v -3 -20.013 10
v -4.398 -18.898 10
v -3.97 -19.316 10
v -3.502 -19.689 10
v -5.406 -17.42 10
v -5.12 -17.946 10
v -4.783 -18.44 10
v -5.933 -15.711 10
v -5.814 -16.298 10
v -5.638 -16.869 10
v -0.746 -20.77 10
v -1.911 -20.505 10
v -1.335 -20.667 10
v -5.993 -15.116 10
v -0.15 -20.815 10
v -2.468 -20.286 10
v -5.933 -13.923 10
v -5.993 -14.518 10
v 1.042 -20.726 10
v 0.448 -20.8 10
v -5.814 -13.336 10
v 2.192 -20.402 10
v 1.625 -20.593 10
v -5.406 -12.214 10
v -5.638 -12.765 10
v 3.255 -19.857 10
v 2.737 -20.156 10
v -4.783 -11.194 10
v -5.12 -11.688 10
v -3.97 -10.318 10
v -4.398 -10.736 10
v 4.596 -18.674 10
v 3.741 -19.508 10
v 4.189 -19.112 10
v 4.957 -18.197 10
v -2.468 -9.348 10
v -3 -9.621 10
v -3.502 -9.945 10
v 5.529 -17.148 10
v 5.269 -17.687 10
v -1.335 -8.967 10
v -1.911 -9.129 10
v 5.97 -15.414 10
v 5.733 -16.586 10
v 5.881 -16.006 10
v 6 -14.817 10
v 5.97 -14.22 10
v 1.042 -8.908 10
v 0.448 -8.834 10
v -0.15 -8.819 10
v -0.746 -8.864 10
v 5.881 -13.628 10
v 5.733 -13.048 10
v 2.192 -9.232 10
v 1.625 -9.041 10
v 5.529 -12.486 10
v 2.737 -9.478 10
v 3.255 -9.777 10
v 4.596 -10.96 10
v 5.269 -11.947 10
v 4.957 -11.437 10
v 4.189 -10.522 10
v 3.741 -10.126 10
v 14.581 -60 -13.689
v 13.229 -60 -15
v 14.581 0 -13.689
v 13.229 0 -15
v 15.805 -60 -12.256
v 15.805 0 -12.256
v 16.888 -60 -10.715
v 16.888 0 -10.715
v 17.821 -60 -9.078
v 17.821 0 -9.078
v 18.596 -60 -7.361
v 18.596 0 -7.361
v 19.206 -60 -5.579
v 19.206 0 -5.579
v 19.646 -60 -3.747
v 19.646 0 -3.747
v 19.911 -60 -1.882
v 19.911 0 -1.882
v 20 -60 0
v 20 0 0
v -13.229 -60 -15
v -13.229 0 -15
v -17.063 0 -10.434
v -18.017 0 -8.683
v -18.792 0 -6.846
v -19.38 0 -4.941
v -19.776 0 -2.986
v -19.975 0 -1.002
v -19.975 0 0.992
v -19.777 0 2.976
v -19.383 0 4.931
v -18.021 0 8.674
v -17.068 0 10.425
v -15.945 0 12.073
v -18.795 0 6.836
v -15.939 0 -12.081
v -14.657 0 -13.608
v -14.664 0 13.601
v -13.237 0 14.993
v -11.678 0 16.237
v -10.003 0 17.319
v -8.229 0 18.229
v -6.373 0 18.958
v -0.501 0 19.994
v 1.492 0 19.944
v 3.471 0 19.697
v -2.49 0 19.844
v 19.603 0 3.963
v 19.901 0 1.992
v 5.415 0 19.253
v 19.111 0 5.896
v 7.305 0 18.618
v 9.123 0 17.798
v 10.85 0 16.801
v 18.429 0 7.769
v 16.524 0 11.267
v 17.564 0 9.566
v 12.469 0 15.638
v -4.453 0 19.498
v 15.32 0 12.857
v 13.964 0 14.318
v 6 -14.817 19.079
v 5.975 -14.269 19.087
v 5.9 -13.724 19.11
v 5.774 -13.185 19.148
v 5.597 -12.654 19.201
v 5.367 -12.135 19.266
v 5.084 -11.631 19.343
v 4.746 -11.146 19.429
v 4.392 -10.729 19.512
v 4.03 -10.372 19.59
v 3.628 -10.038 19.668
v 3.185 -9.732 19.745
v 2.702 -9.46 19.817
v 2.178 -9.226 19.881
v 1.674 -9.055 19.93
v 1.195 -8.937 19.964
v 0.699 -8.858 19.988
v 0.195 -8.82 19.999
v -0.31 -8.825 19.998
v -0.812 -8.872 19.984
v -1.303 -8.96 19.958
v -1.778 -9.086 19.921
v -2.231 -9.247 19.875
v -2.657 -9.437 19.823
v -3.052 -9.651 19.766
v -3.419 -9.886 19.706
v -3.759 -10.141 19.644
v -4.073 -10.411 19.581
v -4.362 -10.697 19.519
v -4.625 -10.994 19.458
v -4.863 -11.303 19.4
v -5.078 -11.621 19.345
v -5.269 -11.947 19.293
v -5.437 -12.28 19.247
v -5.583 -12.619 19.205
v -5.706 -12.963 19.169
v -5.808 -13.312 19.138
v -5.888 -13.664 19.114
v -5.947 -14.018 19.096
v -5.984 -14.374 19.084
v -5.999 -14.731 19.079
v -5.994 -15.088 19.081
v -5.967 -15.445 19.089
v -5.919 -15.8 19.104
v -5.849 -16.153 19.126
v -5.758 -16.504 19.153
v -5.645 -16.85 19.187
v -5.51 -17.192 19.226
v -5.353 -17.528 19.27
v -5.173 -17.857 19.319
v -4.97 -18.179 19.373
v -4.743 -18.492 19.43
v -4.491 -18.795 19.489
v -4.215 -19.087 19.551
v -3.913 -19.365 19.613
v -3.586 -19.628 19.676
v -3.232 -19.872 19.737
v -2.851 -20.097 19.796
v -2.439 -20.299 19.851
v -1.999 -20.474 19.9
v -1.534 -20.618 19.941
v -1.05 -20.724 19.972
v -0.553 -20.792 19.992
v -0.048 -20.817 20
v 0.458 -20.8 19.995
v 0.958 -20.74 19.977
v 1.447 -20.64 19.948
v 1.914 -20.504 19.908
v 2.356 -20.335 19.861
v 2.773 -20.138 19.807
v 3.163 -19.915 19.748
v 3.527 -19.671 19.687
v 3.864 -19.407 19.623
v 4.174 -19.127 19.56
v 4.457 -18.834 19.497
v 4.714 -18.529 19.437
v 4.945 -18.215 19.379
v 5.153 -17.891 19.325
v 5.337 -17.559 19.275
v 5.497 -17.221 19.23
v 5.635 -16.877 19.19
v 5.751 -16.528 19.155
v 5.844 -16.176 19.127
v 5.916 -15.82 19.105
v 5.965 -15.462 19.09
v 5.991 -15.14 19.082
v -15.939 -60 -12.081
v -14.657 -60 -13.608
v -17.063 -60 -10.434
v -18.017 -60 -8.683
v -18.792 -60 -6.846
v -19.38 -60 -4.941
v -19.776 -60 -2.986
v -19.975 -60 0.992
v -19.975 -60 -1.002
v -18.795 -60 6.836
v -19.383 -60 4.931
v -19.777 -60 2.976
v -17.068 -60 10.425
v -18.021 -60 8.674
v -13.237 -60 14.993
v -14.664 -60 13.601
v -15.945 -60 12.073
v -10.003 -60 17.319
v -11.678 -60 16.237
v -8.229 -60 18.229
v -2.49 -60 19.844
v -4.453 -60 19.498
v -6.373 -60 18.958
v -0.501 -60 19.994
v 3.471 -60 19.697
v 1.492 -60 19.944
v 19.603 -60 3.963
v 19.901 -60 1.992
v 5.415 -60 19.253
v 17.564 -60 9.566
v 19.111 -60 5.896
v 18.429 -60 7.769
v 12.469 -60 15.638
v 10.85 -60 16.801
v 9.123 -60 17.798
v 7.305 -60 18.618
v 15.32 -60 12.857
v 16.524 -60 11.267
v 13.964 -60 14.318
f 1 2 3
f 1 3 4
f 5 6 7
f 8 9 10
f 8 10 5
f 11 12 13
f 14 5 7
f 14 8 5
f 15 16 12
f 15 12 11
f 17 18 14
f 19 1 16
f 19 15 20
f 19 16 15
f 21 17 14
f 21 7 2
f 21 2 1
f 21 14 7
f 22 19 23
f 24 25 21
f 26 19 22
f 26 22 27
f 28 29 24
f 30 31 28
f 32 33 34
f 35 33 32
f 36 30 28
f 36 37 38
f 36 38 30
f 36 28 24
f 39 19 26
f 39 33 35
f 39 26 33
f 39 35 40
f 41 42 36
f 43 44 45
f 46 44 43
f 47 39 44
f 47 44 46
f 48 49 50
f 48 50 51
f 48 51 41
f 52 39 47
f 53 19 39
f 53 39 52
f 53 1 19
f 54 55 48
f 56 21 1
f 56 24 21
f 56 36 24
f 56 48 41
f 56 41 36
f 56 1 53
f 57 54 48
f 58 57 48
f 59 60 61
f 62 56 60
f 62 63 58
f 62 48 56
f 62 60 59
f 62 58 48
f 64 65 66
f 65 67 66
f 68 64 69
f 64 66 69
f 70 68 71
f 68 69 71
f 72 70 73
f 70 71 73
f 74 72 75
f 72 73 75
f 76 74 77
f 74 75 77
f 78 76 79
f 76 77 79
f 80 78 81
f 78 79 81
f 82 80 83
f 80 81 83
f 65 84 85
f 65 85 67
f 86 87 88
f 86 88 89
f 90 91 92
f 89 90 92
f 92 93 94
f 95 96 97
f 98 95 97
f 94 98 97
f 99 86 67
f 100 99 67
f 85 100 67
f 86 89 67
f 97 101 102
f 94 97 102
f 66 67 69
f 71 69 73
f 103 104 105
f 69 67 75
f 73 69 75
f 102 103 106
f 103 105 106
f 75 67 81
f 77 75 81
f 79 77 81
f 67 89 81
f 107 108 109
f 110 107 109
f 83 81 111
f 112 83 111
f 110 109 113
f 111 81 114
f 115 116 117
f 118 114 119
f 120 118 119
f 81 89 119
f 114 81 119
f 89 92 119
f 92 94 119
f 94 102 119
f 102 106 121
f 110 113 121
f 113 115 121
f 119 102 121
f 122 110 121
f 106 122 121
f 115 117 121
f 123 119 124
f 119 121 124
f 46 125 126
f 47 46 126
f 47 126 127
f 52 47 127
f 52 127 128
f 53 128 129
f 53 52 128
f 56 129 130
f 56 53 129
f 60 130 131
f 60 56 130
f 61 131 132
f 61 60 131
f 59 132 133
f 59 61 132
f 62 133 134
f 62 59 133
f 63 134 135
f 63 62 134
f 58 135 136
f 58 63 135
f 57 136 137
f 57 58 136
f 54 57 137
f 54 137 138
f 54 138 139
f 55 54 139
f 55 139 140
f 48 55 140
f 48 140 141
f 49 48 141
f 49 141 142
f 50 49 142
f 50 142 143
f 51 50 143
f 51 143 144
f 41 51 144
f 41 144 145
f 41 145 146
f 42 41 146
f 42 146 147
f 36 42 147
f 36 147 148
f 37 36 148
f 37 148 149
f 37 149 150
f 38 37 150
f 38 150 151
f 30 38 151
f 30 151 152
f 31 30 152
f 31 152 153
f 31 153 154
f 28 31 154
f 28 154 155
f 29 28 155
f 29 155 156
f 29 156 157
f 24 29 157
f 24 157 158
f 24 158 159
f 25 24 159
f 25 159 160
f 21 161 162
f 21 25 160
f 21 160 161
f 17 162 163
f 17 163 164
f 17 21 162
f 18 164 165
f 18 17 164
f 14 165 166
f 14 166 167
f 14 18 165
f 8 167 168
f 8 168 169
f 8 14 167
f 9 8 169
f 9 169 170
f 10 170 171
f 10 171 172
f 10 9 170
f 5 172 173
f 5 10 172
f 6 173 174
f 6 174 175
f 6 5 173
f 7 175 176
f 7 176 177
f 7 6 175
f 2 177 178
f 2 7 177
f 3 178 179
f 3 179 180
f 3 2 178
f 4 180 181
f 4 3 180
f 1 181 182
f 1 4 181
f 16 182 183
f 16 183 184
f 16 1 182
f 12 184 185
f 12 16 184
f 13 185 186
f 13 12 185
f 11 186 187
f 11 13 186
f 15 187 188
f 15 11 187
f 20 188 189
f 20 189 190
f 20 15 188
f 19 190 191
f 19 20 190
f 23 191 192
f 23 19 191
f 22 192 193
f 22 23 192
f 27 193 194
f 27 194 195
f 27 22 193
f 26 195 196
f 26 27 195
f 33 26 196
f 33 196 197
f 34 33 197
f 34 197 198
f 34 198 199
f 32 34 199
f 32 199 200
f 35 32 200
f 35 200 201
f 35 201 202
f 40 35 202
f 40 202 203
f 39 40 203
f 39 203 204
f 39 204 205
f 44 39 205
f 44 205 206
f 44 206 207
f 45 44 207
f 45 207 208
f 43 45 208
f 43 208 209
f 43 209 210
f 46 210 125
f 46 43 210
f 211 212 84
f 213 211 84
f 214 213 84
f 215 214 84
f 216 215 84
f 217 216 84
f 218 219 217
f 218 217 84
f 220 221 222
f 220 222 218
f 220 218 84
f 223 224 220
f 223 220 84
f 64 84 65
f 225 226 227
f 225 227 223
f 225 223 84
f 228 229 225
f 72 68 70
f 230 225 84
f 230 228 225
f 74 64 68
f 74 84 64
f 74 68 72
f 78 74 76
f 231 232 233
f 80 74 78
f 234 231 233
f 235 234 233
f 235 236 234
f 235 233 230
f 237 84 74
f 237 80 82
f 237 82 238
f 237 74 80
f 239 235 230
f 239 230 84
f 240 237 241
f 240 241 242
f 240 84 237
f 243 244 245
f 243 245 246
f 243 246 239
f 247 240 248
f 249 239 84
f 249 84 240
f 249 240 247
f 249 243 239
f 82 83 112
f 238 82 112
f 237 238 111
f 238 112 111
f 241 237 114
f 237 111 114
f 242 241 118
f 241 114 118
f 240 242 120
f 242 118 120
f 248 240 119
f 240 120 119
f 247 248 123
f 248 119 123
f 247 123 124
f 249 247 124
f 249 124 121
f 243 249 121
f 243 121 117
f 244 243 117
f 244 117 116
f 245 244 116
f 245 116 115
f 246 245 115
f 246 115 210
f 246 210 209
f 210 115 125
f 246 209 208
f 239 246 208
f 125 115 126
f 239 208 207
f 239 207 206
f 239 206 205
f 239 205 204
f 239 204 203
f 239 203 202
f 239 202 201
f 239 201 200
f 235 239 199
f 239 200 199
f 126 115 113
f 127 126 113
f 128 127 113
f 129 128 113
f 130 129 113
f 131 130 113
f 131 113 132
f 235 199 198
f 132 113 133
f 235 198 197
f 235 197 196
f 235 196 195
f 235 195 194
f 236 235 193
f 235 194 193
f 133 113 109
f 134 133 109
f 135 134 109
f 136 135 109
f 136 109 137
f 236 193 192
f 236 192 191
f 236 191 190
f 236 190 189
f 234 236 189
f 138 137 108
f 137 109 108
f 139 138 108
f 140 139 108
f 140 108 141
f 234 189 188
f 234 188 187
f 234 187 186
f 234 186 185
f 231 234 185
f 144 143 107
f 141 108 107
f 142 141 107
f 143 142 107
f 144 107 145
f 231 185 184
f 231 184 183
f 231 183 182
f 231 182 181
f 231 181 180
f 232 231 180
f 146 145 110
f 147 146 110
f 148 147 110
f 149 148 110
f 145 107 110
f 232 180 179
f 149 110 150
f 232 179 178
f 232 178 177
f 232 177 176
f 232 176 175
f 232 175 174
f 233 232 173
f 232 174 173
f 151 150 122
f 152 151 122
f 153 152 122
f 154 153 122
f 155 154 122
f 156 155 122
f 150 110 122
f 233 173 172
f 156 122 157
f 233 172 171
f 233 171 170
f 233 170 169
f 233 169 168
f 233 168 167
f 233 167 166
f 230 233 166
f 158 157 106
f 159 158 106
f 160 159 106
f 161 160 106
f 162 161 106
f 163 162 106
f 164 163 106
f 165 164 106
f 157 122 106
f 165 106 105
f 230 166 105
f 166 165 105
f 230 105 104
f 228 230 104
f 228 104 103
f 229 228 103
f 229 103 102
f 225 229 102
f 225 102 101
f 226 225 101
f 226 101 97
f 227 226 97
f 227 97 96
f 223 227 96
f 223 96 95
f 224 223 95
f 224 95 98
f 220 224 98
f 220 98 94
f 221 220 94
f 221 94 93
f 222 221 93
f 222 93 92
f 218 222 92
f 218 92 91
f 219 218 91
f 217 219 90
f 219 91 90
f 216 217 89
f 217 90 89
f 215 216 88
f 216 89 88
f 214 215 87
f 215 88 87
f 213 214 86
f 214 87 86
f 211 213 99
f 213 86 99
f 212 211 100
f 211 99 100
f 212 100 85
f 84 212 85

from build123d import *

# Parameters (mm, degrees)
F0_R     = 20
F1_DEPTH = 60
F3_R     = 6
F4_DEPTH = 23.59607
F5_W     = 79.34783
F5_H     = 17.173914
F6_DEPTH = 121.24079


with BuildPart() as f1:
    # F0 (on Front) → F1 (new body)
    with BuildSketch(Plane.XZ):
        Circle(F0_R)
    extrude(amount=F1_DEPTH)

    # F3 (on offset) → F4 (cut)
    with BuildSketch(Plane.XY.offset(10)):
        with Locations((0, -14.817017)):
            Circle(F3_R)
    extrude(amount=F4_DEPTH, mode=Mode.SUBTRACT)

    # F5 (on face) → F6 (cut)
    with BuildSketch(Plane.XZ.offset(60)):
        with Locations((7.579689, -23.586957)):
            Rectangle(F5_W, F5_H)
    extrude(amount=-F6_DEPTH, mode=Mode.SUBTRACT)


solid = f1.part
